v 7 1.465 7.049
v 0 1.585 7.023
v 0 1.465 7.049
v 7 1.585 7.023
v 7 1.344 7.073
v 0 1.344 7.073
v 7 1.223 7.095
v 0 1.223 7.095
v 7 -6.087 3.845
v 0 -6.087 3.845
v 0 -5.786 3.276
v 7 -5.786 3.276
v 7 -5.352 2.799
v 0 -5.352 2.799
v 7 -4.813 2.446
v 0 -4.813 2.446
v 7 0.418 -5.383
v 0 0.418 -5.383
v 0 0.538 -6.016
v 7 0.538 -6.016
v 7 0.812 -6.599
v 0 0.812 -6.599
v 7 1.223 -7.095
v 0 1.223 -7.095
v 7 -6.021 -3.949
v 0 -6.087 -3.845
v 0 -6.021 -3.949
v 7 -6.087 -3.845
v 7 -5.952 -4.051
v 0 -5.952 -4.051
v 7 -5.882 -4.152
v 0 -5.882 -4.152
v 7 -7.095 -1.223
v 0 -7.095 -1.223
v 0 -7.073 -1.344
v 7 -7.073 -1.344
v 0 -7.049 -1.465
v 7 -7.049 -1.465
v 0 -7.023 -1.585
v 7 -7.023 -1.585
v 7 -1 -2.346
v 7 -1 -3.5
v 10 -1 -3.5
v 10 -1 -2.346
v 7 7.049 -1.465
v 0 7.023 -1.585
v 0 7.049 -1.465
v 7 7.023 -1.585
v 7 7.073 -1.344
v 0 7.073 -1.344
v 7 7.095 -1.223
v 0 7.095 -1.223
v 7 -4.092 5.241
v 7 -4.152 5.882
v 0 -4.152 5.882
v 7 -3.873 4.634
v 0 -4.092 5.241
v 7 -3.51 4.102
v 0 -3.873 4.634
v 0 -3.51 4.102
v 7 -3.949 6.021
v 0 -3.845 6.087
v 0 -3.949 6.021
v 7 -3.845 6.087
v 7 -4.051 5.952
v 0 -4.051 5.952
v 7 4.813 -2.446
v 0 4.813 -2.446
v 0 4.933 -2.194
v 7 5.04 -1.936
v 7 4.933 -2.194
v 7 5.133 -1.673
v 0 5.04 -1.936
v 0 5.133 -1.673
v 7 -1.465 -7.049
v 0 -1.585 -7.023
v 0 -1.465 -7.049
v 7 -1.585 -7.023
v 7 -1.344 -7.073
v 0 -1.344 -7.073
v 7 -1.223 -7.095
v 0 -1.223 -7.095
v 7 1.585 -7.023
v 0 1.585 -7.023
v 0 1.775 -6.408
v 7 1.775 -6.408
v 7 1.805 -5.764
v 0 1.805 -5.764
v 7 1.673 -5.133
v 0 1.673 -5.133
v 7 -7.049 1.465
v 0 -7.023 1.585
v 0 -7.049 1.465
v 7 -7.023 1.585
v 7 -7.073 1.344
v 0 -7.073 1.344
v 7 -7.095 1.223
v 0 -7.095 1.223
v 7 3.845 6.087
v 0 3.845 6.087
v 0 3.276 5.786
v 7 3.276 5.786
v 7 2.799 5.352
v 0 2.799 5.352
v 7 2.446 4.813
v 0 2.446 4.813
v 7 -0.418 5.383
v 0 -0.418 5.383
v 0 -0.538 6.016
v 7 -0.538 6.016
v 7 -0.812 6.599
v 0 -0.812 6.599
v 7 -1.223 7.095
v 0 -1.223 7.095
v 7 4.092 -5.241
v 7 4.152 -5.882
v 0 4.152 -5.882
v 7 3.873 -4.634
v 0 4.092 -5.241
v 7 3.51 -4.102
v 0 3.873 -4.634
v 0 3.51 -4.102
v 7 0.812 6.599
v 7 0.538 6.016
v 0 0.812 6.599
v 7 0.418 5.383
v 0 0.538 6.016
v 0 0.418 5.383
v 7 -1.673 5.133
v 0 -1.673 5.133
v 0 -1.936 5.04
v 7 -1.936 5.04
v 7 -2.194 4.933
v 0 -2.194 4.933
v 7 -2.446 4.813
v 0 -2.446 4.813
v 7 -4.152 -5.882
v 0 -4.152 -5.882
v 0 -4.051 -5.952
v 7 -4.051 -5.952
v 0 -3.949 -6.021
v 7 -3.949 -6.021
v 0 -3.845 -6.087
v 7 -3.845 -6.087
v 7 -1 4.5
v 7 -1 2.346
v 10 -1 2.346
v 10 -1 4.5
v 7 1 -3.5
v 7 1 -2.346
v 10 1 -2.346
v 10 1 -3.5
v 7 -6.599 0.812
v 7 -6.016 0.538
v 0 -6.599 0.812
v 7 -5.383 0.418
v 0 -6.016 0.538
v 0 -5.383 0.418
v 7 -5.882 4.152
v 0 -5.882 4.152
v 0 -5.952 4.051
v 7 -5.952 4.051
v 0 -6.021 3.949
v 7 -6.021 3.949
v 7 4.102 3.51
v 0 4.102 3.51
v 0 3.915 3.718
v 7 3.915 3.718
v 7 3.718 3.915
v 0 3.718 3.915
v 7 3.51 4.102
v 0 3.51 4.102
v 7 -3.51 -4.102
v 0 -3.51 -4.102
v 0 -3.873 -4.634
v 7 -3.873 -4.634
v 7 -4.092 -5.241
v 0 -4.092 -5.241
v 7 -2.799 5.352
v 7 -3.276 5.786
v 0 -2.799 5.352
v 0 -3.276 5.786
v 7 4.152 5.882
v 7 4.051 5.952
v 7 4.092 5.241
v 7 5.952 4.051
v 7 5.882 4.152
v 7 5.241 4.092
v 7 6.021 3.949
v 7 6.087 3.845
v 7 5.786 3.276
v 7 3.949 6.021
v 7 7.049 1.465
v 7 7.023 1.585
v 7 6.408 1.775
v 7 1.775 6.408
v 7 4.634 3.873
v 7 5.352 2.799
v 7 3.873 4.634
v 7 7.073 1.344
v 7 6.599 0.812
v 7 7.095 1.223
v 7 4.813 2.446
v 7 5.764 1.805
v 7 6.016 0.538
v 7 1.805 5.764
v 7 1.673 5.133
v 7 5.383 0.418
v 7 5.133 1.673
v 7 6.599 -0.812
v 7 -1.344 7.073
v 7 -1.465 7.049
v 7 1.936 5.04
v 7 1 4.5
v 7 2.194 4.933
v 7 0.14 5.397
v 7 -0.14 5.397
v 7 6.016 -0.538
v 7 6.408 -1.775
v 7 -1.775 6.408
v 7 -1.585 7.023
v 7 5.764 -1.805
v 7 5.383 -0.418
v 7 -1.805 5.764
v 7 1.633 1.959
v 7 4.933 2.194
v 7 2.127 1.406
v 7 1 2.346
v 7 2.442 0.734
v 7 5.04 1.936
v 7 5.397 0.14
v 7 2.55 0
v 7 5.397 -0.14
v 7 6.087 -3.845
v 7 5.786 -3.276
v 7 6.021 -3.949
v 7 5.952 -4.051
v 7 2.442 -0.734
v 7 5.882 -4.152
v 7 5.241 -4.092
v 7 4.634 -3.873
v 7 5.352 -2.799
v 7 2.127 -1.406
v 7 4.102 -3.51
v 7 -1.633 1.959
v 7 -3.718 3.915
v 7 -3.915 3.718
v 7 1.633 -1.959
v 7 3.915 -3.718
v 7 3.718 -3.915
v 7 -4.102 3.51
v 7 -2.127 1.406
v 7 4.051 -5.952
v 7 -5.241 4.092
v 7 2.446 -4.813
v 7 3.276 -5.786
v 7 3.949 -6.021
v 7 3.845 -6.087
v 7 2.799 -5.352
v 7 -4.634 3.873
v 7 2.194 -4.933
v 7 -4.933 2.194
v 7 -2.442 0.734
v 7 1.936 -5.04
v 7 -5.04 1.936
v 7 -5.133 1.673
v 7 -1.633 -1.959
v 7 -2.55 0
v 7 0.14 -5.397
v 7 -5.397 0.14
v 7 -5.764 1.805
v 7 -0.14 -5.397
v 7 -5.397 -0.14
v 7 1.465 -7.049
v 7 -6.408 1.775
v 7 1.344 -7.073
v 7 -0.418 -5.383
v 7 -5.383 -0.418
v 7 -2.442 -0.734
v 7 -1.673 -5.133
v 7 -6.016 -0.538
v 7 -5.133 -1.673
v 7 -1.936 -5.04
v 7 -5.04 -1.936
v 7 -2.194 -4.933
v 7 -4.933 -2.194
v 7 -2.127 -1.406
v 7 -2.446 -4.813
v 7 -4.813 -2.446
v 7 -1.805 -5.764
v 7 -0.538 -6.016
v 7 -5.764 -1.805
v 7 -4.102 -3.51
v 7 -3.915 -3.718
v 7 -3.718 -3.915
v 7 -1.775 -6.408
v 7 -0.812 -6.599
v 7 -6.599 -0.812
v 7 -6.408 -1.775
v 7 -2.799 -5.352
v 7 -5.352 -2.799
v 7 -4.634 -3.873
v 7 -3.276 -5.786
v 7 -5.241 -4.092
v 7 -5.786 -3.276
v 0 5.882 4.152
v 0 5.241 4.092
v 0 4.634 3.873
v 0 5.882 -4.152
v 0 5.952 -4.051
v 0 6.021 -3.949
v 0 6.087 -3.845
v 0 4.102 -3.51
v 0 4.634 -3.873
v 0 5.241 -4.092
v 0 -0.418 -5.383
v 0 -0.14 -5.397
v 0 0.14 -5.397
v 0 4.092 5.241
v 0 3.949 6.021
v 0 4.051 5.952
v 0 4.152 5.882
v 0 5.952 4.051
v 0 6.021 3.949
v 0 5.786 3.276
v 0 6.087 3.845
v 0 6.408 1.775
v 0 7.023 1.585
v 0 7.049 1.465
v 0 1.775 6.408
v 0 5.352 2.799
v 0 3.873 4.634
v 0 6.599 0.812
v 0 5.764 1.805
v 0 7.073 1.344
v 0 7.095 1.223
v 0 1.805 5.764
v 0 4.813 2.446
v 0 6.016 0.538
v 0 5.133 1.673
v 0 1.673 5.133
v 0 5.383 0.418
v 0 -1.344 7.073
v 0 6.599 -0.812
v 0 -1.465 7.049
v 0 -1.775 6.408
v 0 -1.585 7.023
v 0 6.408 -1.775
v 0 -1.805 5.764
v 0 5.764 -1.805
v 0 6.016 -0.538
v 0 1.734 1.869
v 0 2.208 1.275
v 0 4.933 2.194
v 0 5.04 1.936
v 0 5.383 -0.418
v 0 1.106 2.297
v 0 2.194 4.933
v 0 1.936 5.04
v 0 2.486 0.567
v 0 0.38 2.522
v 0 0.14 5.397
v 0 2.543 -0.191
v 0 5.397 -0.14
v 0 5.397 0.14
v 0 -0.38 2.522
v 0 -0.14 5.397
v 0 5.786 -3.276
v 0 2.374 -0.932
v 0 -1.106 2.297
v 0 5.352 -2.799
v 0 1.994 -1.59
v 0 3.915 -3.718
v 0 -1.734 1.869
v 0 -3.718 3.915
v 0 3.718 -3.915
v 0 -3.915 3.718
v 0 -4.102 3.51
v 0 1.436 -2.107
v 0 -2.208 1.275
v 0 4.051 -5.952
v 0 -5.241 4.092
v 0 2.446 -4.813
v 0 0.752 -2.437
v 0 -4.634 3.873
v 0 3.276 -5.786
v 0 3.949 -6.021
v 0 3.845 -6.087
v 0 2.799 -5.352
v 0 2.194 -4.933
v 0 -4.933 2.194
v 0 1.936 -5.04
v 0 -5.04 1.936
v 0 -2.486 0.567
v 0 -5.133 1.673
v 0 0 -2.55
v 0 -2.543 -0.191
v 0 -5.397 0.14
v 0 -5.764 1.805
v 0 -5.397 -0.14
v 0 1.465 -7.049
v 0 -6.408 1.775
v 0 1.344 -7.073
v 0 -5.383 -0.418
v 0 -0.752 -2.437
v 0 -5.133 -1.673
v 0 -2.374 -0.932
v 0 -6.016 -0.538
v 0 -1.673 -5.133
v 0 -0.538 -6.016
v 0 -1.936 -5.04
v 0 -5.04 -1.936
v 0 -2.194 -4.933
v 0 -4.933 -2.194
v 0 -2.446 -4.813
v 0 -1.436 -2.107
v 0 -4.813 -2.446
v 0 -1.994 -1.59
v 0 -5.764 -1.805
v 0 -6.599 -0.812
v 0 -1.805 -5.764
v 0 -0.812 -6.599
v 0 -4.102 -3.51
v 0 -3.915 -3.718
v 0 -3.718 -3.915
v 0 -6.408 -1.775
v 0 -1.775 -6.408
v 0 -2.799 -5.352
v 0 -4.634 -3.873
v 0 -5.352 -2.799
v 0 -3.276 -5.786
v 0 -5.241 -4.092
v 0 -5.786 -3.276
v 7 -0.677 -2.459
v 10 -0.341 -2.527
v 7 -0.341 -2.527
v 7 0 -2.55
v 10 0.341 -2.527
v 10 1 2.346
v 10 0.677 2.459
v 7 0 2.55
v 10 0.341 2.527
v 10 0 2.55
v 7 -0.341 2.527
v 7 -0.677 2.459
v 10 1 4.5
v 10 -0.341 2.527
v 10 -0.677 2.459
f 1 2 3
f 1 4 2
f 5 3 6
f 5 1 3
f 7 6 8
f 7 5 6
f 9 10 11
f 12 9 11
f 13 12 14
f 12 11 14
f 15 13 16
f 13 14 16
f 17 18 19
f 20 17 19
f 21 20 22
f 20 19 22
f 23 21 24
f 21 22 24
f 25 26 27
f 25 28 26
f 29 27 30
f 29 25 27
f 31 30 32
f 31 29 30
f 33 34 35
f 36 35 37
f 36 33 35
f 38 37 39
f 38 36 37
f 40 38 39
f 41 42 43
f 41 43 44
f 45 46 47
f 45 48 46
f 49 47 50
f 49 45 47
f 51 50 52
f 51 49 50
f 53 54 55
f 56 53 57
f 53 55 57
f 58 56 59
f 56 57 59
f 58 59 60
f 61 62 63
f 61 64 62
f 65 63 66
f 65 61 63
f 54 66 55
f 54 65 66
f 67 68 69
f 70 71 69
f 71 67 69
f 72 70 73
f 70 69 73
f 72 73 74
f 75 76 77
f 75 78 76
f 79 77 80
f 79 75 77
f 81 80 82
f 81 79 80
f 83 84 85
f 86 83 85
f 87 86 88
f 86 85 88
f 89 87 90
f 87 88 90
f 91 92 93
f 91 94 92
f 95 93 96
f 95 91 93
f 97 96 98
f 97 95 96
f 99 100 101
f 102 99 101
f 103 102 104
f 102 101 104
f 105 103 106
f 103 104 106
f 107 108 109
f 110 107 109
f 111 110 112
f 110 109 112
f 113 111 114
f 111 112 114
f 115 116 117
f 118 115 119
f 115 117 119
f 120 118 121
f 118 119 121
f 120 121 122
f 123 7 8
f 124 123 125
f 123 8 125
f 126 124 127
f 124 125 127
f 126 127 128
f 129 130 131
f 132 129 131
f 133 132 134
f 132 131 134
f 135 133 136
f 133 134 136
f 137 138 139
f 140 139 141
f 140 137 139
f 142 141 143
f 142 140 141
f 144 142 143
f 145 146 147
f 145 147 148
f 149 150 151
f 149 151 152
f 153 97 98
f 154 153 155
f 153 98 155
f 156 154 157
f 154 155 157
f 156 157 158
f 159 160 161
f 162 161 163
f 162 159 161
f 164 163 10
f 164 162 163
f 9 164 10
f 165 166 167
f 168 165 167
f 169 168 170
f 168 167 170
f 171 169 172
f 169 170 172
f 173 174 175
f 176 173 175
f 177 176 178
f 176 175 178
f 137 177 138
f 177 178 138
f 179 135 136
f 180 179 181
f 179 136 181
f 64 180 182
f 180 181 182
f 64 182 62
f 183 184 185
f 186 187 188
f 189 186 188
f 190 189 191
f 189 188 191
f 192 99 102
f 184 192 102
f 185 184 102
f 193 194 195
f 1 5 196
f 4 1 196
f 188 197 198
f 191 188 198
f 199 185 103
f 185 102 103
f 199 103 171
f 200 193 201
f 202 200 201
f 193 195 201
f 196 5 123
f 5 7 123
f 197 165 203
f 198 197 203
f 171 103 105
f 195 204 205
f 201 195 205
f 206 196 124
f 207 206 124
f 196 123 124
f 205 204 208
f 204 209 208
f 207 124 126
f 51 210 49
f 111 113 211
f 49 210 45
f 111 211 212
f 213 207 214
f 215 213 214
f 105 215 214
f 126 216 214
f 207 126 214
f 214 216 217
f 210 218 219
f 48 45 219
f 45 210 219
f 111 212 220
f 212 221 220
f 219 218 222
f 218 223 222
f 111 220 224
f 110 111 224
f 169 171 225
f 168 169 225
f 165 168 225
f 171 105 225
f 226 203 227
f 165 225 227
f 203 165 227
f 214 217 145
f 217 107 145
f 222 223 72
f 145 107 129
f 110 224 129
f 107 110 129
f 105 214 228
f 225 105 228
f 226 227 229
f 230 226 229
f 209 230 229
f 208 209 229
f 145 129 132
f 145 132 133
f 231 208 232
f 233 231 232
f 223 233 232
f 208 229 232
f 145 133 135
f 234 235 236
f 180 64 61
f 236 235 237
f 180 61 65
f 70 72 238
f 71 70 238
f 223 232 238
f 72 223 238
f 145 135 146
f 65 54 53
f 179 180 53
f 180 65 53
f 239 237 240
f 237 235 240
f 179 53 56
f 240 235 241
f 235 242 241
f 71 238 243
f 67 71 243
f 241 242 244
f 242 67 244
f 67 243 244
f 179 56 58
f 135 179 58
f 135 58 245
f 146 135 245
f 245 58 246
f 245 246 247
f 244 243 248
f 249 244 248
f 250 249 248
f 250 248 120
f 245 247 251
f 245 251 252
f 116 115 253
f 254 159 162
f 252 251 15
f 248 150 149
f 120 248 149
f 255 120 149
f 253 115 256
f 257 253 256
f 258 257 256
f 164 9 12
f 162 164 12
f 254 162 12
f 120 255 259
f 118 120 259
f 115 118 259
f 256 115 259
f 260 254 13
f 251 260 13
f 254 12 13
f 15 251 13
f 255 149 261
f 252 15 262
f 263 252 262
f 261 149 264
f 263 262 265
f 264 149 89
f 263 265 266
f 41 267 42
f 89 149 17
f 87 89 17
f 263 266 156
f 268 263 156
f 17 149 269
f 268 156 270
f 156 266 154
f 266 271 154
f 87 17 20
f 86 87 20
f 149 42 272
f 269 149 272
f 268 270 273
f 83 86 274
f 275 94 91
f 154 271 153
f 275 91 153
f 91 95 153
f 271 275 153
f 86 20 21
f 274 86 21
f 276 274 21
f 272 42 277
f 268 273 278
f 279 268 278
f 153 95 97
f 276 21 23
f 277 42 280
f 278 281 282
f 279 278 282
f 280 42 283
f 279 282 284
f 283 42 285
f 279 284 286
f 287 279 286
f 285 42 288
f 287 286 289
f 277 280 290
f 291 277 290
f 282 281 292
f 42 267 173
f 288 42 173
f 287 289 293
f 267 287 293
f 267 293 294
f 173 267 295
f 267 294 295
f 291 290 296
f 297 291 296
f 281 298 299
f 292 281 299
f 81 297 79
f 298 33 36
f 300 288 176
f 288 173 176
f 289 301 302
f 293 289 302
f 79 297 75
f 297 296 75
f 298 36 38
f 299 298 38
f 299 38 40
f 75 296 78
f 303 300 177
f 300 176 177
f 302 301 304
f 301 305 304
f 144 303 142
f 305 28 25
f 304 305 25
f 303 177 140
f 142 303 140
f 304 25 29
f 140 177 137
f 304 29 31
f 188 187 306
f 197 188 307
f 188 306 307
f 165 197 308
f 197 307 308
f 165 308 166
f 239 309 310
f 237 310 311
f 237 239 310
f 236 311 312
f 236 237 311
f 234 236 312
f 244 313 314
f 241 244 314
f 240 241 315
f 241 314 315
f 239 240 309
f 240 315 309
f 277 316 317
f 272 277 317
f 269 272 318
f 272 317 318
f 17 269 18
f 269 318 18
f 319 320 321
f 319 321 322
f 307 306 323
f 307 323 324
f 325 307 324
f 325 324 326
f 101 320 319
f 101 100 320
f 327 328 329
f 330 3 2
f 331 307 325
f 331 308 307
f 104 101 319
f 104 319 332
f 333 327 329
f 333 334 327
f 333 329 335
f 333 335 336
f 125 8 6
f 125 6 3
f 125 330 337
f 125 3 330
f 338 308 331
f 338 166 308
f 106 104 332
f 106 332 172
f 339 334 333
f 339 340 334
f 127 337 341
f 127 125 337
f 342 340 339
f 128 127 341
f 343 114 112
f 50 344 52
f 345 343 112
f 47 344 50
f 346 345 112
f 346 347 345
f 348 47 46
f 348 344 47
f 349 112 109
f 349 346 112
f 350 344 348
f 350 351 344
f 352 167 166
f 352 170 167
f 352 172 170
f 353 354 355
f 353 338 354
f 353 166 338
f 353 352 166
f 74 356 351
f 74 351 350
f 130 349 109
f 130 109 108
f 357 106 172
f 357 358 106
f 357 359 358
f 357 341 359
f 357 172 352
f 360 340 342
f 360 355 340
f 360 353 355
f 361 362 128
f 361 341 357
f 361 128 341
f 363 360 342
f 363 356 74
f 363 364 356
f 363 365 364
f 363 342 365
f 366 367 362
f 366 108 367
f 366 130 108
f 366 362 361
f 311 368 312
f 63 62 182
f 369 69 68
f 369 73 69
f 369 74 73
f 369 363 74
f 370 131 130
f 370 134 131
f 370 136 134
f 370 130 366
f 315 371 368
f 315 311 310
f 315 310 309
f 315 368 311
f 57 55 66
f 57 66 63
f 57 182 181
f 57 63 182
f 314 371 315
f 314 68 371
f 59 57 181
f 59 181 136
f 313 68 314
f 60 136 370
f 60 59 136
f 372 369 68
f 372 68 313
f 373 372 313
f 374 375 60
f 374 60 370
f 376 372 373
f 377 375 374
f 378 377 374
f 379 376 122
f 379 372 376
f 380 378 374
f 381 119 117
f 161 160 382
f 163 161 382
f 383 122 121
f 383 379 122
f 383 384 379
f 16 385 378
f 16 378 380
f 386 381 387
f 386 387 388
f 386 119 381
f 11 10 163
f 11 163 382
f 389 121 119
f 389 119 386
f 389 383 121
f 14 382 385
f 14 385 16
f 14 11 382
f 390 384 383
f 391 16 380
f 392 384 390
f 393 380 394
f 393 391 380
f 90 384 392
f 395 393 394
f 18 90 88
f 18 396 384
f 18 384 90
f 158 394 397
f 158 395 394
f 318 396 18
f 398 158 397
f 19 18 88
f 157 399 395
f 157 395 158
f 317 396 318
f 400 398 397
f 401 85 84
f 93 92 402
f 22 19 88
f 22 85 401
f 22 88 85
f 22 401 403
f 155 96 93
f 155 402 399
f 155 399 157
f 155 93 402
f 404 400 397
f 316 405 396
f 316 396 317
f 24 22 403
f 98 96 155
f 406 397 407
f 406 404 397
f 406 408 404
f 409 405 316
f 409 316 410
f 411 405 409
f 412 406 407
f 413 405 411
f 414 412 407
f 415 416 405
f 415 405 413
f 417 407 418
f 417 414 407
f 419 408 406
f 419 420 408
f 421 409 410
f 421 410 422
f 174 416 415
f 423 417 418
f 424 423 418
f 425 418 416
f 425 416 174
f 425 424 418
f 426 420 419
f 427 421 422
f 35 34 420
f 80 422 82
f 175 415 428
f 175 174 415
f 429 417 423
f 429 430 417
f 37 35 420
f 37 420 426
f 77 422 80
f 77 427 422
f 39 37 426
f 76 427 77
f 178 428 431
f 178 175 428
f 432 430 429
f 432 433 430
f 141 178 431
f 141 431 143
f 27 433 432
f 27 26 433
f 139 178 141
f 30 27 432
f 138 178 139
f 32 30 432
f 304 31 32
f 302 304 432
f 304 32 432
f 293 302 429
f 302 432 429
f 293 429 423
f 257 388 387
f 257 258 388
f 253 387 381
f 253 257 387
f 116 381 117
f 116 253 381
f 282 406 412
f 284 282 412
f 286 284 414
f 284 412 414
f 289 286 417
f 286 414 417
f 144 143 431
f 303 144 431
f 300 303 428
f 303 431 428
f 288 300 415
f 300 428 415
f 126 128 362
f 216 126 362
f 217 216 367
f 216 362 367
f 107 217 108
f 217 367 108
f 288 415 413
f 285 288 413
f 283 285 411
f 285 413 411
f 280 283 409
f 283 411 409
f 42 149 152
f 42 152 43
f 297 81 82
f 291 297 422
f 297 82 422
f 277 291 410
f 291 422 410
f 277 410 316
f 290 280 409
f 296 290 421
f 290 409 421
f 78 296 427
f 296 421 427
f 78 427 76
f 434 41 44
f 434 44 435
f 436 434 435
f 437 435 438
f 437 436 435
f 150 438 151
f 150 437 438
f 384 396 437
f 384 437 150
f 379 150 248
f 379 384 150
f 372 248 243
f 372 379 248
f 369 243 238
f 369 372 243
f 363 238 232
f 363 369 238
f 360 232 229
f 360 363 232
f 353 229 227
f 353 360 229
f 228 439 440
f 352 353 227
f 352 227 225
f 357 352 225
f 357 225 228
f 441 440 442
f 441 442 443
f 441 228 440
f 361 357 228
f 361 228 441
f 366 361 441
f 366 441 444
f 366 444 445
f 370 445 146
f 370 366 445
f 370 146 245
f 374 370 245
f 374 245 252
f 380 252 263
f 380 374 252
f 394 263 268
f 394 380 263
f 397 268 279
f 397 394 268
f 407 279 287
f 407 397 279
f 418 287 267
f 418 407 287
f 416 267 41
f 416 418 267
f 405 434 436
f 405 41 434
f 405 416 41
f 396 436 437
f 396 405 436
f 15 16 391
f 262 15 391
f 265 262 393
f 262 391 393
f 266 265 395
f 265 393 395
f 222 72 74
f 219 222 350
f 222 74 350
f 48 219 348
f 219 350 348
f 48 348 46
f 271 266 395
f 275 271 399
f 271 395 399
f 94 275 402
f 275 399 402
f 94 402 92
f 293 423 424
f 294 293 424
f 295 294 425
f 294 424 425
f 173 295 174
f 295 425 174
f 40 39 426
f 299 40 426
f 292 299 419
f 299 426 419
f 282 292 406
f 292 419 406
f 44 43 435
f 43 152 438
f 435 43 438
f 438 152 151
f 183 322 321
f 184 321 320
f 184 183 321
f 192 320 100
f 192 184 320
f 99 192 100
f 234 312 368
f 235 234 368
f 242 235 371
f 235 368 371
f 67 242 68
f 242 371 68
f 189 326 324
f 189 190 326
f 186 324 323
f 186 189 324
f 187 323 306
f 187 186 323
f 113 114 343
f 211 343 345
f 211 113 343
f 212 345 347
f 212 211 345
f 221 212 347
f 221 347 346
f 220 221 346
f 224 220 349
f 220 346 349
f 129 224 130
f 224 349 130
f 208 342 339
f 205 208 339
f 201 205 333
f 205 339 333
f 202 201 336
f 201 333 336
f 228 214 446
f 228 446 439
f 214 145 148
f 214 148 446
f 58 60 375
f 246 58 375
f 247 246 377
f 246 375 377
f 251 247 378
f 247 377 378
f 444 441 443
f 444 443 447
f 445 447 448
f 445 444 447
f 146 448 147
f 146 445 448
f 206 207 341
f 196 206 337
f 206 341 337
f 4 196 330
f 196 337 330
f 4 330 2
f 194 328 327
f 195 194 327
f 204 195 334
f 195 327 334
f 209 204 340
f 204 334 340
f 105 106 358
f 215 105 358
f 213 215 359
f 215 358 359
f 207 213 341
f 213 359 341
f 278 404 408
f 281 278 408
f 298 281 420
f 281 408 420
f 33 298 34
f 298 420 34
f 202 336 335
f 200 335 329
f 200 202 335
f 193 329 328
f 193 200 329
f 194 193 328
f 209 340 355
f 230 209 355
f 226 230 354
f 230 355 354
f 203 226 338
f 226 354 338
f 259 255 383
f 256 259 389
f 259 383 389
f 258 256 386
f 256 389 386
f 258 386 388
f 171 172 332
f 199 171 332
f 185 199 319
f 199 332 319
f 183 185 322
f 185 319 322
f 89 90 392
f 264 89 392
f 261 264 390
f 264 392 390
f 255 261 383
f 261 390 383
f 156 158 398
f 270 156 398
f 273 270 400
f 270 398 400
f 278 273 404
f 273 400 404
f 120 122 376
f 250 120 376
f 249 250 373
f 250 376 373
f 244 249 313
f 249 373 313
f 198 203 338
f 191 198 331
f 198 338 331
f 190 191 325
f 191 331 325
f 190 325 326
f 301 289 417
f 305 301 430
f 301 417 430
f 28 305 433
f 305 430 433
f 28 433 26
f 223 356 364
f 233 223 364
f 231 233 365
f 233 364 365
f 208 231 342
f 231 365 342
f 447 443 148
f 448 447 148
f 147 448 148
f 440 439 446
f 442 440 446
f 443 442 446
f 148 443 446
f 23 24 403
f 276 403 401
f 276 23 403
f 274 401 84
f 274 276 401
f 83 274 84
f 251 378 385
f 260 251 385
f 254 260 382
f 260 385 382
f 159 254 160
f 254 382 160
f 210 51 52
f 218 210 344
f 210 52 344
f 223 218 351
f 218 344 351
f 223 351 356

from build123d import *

# Parameters (mm, degrees)
BASPROSKE_W         = 7
BASPROSKE_H         = 7.2
TOOTHCUT_DEPTH      = 13.356374873
TEETHCUTS_COUNT     = 16
TEETHCUTS_ANGLE     = 337.5
BORSKE_R            = 0.5
BORE_DEPTH          = 50.0000508
SKETCH_1_R          = 2.55
CUT_EXTRUDE_1_DEPTH = 13.234691538
EXTRUDE_1_DEPTH     = 3


with BuildPart() as part:
    # BasProSke → Base-Revolve (revolve)
    with BuildSketch(Plane(origin=(0, 0, 0), x_dir=(1, 0, 0), z_dir=(0, 1, 0))):
        with Locations((3.5, 3.6)):
            Rectangle(BASPROSKE_W, BASPROSKE_H)
    revolve(axis=Axis((-10, 0, 0), (1, 0, 0)))

    # TooCutSke → ToothCut (cut, through all)
    with BuildSketch(Plane(origin=(0, 0, 0), x_dir=(0, 0, -1), z_dir=(1, 0, 0))):
        with BuildLine():
            ThreePointArc((0.418431057, 5.382761043), (0, 5.399), (-0.418431057, 5.382761043))
            ThreePointArc((-0.418431057, 5.382761043), (-0.663605074, 6.330572066), (-1.246629414, 7.117044349))
            ThreePointArc((-1.246629414, 7.117044349), (0, 7.2254), (1.246629414, 7.117044349))
            ThreePointArc((1.246629414, 7.117044349), (0.663605074, 6.330572066), (0.418431057, 5.382761043))
        make_face()
    toothcut = extrude(amount=TOOTHCUT_DEPTH, mode=Mode.SUBTRACT)

    # TeethCuts: ToothCut ×16 about axis
    teethcuts_axis = Axis((-10, 0, 0), (1, 0, 0))
    for i in range(1, TEETHCUTS_COUNT):
        add(toothcut.rotate(teethcuts_axis, i * TEETHCUTS_ANGLE / (TEETHCUTS_COUNT - 1)), mode=Mode.SUBTRACT)

    # BorSke → Bore (cut, symmetric)
    with BuildSketch(Plane(origin=(0, 0, 0), x_dir=(0, 0, -1), z_dir=(1, 0, 0))):
        Circle(BORSKE_R)
    extrude(amount=BORE_DEPTH, both=True, mode=Mode.SUBTRACT)

    # 草图1 → 切除-拉伸1 (cut, through all)
    with BuildSketch(Plane(origin=(0, 0, 0), x_dir=(0, 0, -1), z_dir=(1, 0, 0))):
        Circle(SKETCH_1_R)
    extrude(amount=CUT_EXTRUDE_1_DEPTH, mode=Mode.SUBTRACT)

    # 草图2 → 凸台-拉伸1 (add)
    with BuildSketch(Plane.ZY.offset(-7)):
        with BuildLine():
            Line((2.345740821, -1), (4.5, -1))
            Line((4.5, -1), (4.5, 1))
            Line((4.5, 1), (2.345740821, 1))
            ThreePointArc((2.345740821, 1), (2.55, 0), (2.345740821, -1))
        make_face()
        with BuildLine():
            Line((-3.5, -1), (-2.345740821, -1))
            ThreePointArc((-2.345740821, -1), (-2.55, 0), (-2.345740821, 1))
            Line((-2.345740821, 1), (-3.5, 1))
            Line((-3.5, 1), (-3.5, -1))
        make_face()
    extrude(amount=-EXTRUDE_1_DEPTH)


solid = part.part
